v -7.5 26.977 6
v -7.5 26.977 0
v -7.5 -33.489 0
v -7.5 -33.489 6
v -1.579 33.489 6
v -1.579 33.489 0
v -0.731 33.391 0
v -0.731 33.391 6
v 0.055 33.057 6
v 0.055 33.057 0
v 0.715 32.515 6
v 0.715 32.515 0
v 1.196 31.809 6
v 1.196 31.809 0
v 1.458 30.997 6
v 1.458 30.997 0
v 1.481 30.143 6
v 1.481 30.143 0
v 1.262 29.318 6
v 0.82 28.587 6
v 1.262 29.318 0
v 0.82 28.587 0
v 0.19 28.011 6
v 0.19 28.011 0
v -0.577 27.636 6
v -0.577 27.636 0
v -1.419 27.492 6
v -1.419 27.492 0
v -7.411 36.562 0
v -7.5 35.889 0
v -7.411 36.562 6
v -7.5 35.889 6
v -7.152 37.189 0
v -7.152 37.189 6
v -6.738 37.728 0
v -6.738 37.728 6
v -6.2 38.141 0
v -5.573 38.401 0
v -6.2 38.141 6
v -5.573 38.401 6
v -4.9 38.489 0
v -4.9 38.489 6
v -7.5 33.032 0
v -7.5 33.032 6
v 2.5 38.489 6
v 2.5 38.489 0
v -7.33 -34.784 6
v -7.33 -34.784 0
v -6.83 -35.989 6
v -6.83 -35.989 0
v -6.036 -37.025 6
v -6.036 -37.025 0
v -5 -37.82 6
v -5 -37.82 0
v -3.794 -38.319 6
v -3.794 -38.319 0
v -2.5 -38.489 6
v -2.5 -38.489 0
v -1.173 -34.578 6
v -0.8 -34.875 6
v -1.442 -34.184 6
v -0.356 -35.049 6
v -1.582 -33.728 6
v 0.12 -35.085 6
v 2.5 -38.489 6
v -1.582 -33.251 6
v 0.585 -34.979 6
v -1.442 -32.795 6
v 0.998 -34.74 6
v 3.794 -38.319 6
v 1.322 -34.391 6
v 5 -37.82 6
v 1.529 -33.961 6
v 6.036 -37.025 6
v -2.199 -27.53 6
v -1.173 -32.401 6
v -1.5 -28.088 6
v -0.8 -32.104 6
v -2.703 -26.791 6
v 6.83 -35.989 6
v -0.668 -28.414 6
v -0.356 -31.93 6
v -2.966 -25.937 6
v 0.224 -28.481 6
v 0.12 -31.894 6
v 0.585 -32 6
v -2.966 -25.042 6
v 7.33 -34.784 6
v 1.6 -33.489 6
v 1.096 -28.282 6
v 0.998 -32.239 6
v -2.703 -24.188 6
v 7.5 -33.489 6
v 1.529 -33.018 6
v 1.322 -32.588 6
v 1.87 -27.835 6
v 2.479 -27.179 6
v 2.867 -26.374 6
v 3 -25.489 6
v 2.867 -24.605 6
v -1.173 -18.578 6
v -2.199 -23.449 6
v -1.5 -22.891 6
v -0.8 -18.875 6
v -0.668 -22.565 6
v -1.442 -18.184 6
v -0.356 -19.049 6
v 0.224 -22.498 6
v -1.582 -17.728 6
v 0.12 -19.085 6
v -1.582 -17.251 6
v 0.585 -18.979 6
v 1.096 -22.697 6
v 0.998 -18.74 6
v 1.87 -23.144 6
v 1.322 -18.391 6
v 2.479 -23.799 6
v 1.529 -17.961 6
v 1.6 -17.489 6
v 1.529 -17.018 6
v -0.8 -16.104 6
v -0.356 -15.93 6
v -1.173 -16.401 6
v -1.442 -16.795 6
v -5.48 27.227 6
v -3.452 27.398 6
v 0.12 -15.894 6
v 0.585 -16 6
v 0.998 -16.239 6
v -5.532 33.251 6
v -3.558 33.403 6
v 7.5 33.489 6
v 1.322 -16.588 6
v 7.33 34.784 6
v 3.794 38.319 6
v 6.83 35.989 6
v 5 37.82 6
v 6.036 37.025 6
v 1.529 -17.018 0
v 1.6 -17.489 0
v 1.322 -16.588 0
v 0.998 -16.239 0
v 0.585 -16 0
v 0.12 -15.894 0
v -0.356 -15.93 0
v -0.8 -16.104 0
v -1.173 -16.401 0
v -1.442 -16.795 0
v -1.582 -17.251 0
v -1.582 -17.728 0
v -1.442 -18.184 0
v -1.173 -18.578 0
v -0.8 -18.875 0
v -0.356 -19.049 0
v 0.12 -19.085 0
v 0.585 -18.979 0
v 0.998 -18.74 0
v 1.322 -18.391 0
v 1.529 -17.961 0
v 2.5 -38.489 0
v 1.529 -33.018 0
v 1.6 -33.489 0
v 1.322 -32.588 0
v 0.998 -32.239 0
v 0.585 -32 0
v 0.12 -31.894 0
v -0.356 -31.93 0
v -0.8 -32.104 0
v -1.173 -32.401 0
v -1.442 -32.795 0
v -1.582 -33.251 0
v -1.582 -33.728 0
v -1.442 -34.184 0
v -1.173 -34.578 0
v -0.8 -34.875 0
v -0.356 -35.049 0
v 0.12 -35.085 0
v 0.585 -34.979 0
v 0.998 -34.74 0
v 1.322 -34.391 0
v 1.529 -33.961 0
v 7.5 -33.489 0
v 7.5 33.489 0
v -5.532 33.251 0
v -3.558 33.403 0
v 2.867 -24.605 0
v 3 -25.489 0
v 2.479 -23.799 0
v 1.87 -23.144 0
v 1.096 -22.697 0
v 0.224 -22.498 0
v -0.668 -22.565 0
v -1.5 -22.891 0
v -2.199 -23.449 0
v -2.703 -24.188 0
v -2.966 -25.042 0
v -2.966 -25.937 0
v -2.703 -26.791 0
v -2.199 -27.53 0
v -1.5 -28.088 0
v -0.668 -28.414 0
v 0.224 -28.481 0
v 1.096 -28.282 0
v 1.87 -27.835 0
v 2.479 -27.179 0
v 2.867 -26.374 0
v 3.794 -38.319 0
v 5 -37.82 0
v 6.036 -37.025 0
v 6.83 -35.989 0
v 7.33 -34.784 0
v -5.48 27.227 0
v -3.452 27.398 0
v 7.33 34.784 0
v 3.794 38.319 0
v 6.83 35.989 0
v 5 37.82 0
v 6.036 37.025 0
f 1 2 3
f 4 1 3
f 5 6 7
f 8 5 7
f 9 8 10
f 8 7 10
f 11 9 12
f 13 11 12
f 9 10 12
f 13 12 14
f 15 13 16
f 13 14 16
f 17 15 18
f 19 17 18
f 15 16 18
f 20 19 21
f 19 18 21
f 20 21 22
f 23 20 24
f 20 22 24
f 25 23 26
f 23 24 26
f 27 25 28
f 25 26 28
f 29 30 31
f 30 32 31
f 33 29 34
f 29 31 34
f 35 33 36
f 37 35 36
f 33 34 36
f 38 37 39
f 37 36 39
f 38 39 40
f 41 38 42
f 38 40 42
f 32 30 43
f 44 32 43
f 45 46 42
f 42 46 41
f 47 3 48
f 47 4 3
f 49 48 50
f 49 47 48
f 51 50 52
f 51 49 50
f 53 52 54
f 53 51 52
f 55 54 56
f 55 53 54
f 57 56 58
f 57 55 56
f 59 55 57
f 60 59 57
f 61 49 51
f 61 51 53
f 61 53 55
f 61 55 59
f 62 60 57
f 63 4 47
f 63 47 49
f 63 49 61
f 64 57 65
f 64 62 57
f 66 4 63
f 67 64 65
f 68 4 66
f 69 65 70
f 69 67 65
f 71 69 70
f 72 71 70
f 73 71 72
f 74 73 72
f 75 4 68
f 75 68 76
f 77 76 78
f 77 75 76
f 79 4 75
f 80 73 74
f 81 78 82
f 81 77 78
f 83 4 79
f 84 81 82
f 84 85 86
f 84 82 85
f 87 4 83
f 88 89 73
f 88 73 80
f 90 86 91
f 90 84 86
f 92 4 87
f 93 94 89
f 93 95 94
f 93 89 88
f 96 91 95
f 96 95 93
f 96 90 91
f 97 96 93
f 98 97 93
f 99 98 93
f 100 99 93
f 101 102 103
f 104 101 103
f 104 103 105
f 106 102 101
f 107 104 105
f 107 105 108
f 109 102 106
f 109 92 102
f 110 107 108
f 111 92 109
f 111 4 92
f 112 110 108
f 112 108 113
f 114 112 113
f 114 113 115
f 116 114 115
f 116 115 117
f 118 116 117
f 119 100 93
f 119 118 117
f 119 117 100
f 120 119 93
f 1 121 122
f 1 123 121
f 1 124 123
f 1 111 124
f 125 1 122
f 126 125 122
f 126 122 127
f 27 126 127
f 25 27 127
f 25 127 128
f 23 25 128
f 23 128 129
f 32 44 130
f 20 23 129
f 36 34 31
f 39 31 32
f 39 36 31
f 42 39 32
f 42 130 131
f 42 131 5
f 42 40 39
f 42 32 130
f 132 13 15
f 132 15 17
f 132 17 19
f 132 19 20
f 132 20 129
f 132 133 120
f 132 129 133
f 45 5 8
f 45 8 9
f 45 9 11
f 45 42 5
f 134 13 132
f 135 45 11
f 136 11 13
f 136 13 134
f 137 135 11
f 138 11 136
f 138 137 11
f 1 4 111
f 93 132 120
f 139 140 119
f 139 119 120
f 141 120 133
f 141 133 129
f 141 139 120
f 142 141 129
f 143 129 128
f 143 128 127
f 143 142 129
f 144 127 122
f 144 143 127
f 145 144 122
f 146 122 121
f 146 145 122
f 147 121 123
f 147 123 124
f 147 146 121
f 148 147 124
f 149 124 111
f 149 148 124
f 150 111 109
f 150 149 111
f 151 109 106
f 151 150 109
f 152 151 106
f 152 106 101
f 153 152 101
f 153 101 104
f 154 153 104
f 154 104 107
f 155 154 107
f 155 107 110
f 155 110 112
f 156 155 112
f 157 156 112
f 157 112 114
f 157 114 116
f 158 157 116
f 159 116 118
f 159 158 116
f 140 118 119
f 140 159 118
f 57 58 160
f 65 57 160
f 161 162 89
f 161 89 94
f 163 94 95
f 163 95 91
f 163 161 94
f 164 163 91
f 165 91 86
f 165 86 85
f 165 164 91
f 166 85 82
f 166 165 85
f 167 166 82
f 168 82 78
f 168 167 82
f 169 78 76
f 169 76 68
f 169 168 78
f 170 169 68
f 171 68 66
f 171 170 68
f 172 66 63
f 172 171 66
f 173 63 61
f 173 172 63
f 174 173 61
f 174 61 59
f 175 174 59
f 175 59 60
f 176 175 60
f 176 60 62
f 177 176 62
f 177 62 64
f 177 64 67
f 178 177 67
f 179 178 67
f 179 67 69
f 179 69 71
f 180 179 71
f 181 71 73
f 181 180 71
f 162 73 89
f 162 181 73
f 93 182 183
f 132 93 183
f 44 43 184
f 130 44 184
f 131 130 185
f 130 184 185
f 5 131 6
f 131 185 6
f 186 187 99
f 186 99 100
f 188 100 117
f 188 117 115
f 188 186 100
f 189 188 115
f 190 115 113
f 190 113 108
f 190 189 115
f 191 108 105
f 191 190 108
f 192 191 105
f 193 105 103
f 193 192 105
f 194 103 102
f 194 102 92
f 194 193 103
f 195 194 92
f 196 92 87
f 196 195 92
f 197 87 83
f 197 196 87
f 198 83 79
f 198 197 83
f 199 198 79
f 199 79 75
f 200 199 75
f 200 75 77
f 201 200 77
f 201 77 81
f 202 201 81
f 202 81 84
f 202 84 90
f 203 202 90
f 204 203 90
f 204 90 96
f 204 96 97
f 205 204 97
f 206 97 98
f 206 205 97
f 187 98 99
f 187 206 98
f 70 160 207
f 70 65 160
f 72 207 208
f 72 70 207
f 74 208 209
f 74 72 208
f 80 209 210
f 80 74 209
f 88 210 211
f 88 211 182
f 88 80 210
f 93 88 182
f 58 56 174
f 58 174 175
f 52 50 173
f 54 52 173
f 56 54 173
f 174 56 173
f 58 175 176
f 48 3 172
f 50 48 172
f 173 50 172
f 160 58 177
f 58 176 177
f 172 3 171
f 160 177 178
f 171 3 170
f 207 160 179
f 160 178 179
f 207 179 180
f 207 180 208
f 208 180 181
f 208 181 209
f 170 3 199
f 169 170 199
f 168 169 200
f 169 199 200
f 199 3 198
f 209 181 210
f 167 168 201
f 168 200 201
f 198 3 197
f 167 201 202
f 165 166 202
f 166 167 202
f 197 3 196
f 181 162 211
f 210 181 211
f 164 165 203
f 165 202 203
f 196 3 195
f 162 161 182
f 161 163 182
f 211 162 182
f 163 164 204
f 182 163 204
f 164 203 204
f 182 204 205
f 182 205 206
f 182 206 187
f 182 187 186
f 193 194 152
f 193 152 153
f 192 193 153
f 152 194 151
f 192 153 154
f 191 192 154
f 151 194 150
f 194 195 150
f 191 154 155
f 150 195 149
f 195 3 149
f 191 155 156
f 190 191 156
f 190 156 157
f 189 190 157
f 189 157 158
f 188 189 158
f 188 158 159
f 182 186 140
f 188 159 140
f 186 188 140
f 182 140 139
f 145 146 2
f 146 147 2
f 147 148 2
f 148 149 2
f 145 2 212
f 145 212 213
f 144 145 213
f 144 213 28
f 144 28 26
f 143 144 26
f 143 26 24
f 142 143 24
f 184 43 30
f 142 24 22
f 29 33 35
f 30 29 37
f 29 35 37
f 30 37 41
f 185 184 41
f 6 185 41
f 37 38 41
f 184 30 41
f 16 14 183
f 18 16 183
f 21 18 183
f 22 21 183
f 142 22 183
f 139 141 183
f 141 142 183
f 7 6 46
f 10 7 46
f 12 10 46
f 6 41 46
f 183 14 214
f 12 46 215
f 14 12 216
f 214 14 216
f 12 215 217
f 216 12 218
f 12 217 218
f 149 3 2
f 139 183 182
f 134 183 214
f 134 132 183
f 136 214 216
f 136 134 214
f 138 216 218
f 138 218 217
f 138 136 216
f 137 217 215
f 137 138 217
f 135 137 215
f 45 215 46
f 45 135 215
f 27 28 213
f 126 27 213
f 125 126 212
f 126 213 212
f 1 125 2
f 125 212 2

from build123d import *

# Parameters (mm, degrees)
ESBO_O1_R                = 1.6
ESBO_O1_R_2              = 3
RESSALTO_EXTRUS_O1_DEPTH = 6
FILETE1_R                = 5
FILETE2_R                = 2.6


with BuildPart() as part:
    # Esboço1 → Ressalto-extrusão1 (new body)
    with BuildSketch(Plane.XY):
        with BuildLine():
            Line((-7.5, 26.977225559), (-7.5, -38.489430519))
            Line((-7.5, -38.489430519), (7.5, -38.489430519))
            Line((7.5, -38.489430519), (7.5, 38.489430519))
            Line((7.5, 38.489430519), (-7.5, 38.489430519))
            Line((-7.5, 38.489430519), (-7.5, 33.031933101))
            ThreePointArc((-7.5, 33.031933101), (-4.54537196, 33.335220723), (-1.579224698, 33.489430519))
            ThreePointArc((-1.579224698, 33.489430519), (1.5, 30.570804942), (-1.418625577, 27.491580244))
            ThreePointArc((-1.418625577, 27.491580244), (-4.466722594, 27.322011321), (-7.5, 26.977225559))
        make_face()
        with Locations((0, -33.489430519)):
            Circle(ESBO_O1_R, mode=Mode.SUBTRACT)
        with Locations((0, -25.489430519)):
            Circle(ESBO_O1_R_2, mode=Mode.SUBTRACT)
        with Locations((0, -17.489430519)):
            Circle(ESBO_O1_R, mode=Mode.SUBTRACT)
    extrude(amount=RESSALTO_EXTRUS_O1_DEPTH)

    # Filete1
    filete1_edges = [part.edges().sort_by_distance(p)[0] for p in [
        (7.5, 38.489430519, 3),
        (7.5, -38.489430519, 3),
        (-7.5, -38.489430519, 3),
    ]]
    fillet(filete1_edges, radius=FILETE1_R)

    # Filete2
    filete2_edges = [part.edges().sort_by_distance(p)[0] for p in [
        (-7.5, 38.489430519, 3),
    ]]
    fillet(filete2_edges, radius=FILETE2_R)


solid = part.part
